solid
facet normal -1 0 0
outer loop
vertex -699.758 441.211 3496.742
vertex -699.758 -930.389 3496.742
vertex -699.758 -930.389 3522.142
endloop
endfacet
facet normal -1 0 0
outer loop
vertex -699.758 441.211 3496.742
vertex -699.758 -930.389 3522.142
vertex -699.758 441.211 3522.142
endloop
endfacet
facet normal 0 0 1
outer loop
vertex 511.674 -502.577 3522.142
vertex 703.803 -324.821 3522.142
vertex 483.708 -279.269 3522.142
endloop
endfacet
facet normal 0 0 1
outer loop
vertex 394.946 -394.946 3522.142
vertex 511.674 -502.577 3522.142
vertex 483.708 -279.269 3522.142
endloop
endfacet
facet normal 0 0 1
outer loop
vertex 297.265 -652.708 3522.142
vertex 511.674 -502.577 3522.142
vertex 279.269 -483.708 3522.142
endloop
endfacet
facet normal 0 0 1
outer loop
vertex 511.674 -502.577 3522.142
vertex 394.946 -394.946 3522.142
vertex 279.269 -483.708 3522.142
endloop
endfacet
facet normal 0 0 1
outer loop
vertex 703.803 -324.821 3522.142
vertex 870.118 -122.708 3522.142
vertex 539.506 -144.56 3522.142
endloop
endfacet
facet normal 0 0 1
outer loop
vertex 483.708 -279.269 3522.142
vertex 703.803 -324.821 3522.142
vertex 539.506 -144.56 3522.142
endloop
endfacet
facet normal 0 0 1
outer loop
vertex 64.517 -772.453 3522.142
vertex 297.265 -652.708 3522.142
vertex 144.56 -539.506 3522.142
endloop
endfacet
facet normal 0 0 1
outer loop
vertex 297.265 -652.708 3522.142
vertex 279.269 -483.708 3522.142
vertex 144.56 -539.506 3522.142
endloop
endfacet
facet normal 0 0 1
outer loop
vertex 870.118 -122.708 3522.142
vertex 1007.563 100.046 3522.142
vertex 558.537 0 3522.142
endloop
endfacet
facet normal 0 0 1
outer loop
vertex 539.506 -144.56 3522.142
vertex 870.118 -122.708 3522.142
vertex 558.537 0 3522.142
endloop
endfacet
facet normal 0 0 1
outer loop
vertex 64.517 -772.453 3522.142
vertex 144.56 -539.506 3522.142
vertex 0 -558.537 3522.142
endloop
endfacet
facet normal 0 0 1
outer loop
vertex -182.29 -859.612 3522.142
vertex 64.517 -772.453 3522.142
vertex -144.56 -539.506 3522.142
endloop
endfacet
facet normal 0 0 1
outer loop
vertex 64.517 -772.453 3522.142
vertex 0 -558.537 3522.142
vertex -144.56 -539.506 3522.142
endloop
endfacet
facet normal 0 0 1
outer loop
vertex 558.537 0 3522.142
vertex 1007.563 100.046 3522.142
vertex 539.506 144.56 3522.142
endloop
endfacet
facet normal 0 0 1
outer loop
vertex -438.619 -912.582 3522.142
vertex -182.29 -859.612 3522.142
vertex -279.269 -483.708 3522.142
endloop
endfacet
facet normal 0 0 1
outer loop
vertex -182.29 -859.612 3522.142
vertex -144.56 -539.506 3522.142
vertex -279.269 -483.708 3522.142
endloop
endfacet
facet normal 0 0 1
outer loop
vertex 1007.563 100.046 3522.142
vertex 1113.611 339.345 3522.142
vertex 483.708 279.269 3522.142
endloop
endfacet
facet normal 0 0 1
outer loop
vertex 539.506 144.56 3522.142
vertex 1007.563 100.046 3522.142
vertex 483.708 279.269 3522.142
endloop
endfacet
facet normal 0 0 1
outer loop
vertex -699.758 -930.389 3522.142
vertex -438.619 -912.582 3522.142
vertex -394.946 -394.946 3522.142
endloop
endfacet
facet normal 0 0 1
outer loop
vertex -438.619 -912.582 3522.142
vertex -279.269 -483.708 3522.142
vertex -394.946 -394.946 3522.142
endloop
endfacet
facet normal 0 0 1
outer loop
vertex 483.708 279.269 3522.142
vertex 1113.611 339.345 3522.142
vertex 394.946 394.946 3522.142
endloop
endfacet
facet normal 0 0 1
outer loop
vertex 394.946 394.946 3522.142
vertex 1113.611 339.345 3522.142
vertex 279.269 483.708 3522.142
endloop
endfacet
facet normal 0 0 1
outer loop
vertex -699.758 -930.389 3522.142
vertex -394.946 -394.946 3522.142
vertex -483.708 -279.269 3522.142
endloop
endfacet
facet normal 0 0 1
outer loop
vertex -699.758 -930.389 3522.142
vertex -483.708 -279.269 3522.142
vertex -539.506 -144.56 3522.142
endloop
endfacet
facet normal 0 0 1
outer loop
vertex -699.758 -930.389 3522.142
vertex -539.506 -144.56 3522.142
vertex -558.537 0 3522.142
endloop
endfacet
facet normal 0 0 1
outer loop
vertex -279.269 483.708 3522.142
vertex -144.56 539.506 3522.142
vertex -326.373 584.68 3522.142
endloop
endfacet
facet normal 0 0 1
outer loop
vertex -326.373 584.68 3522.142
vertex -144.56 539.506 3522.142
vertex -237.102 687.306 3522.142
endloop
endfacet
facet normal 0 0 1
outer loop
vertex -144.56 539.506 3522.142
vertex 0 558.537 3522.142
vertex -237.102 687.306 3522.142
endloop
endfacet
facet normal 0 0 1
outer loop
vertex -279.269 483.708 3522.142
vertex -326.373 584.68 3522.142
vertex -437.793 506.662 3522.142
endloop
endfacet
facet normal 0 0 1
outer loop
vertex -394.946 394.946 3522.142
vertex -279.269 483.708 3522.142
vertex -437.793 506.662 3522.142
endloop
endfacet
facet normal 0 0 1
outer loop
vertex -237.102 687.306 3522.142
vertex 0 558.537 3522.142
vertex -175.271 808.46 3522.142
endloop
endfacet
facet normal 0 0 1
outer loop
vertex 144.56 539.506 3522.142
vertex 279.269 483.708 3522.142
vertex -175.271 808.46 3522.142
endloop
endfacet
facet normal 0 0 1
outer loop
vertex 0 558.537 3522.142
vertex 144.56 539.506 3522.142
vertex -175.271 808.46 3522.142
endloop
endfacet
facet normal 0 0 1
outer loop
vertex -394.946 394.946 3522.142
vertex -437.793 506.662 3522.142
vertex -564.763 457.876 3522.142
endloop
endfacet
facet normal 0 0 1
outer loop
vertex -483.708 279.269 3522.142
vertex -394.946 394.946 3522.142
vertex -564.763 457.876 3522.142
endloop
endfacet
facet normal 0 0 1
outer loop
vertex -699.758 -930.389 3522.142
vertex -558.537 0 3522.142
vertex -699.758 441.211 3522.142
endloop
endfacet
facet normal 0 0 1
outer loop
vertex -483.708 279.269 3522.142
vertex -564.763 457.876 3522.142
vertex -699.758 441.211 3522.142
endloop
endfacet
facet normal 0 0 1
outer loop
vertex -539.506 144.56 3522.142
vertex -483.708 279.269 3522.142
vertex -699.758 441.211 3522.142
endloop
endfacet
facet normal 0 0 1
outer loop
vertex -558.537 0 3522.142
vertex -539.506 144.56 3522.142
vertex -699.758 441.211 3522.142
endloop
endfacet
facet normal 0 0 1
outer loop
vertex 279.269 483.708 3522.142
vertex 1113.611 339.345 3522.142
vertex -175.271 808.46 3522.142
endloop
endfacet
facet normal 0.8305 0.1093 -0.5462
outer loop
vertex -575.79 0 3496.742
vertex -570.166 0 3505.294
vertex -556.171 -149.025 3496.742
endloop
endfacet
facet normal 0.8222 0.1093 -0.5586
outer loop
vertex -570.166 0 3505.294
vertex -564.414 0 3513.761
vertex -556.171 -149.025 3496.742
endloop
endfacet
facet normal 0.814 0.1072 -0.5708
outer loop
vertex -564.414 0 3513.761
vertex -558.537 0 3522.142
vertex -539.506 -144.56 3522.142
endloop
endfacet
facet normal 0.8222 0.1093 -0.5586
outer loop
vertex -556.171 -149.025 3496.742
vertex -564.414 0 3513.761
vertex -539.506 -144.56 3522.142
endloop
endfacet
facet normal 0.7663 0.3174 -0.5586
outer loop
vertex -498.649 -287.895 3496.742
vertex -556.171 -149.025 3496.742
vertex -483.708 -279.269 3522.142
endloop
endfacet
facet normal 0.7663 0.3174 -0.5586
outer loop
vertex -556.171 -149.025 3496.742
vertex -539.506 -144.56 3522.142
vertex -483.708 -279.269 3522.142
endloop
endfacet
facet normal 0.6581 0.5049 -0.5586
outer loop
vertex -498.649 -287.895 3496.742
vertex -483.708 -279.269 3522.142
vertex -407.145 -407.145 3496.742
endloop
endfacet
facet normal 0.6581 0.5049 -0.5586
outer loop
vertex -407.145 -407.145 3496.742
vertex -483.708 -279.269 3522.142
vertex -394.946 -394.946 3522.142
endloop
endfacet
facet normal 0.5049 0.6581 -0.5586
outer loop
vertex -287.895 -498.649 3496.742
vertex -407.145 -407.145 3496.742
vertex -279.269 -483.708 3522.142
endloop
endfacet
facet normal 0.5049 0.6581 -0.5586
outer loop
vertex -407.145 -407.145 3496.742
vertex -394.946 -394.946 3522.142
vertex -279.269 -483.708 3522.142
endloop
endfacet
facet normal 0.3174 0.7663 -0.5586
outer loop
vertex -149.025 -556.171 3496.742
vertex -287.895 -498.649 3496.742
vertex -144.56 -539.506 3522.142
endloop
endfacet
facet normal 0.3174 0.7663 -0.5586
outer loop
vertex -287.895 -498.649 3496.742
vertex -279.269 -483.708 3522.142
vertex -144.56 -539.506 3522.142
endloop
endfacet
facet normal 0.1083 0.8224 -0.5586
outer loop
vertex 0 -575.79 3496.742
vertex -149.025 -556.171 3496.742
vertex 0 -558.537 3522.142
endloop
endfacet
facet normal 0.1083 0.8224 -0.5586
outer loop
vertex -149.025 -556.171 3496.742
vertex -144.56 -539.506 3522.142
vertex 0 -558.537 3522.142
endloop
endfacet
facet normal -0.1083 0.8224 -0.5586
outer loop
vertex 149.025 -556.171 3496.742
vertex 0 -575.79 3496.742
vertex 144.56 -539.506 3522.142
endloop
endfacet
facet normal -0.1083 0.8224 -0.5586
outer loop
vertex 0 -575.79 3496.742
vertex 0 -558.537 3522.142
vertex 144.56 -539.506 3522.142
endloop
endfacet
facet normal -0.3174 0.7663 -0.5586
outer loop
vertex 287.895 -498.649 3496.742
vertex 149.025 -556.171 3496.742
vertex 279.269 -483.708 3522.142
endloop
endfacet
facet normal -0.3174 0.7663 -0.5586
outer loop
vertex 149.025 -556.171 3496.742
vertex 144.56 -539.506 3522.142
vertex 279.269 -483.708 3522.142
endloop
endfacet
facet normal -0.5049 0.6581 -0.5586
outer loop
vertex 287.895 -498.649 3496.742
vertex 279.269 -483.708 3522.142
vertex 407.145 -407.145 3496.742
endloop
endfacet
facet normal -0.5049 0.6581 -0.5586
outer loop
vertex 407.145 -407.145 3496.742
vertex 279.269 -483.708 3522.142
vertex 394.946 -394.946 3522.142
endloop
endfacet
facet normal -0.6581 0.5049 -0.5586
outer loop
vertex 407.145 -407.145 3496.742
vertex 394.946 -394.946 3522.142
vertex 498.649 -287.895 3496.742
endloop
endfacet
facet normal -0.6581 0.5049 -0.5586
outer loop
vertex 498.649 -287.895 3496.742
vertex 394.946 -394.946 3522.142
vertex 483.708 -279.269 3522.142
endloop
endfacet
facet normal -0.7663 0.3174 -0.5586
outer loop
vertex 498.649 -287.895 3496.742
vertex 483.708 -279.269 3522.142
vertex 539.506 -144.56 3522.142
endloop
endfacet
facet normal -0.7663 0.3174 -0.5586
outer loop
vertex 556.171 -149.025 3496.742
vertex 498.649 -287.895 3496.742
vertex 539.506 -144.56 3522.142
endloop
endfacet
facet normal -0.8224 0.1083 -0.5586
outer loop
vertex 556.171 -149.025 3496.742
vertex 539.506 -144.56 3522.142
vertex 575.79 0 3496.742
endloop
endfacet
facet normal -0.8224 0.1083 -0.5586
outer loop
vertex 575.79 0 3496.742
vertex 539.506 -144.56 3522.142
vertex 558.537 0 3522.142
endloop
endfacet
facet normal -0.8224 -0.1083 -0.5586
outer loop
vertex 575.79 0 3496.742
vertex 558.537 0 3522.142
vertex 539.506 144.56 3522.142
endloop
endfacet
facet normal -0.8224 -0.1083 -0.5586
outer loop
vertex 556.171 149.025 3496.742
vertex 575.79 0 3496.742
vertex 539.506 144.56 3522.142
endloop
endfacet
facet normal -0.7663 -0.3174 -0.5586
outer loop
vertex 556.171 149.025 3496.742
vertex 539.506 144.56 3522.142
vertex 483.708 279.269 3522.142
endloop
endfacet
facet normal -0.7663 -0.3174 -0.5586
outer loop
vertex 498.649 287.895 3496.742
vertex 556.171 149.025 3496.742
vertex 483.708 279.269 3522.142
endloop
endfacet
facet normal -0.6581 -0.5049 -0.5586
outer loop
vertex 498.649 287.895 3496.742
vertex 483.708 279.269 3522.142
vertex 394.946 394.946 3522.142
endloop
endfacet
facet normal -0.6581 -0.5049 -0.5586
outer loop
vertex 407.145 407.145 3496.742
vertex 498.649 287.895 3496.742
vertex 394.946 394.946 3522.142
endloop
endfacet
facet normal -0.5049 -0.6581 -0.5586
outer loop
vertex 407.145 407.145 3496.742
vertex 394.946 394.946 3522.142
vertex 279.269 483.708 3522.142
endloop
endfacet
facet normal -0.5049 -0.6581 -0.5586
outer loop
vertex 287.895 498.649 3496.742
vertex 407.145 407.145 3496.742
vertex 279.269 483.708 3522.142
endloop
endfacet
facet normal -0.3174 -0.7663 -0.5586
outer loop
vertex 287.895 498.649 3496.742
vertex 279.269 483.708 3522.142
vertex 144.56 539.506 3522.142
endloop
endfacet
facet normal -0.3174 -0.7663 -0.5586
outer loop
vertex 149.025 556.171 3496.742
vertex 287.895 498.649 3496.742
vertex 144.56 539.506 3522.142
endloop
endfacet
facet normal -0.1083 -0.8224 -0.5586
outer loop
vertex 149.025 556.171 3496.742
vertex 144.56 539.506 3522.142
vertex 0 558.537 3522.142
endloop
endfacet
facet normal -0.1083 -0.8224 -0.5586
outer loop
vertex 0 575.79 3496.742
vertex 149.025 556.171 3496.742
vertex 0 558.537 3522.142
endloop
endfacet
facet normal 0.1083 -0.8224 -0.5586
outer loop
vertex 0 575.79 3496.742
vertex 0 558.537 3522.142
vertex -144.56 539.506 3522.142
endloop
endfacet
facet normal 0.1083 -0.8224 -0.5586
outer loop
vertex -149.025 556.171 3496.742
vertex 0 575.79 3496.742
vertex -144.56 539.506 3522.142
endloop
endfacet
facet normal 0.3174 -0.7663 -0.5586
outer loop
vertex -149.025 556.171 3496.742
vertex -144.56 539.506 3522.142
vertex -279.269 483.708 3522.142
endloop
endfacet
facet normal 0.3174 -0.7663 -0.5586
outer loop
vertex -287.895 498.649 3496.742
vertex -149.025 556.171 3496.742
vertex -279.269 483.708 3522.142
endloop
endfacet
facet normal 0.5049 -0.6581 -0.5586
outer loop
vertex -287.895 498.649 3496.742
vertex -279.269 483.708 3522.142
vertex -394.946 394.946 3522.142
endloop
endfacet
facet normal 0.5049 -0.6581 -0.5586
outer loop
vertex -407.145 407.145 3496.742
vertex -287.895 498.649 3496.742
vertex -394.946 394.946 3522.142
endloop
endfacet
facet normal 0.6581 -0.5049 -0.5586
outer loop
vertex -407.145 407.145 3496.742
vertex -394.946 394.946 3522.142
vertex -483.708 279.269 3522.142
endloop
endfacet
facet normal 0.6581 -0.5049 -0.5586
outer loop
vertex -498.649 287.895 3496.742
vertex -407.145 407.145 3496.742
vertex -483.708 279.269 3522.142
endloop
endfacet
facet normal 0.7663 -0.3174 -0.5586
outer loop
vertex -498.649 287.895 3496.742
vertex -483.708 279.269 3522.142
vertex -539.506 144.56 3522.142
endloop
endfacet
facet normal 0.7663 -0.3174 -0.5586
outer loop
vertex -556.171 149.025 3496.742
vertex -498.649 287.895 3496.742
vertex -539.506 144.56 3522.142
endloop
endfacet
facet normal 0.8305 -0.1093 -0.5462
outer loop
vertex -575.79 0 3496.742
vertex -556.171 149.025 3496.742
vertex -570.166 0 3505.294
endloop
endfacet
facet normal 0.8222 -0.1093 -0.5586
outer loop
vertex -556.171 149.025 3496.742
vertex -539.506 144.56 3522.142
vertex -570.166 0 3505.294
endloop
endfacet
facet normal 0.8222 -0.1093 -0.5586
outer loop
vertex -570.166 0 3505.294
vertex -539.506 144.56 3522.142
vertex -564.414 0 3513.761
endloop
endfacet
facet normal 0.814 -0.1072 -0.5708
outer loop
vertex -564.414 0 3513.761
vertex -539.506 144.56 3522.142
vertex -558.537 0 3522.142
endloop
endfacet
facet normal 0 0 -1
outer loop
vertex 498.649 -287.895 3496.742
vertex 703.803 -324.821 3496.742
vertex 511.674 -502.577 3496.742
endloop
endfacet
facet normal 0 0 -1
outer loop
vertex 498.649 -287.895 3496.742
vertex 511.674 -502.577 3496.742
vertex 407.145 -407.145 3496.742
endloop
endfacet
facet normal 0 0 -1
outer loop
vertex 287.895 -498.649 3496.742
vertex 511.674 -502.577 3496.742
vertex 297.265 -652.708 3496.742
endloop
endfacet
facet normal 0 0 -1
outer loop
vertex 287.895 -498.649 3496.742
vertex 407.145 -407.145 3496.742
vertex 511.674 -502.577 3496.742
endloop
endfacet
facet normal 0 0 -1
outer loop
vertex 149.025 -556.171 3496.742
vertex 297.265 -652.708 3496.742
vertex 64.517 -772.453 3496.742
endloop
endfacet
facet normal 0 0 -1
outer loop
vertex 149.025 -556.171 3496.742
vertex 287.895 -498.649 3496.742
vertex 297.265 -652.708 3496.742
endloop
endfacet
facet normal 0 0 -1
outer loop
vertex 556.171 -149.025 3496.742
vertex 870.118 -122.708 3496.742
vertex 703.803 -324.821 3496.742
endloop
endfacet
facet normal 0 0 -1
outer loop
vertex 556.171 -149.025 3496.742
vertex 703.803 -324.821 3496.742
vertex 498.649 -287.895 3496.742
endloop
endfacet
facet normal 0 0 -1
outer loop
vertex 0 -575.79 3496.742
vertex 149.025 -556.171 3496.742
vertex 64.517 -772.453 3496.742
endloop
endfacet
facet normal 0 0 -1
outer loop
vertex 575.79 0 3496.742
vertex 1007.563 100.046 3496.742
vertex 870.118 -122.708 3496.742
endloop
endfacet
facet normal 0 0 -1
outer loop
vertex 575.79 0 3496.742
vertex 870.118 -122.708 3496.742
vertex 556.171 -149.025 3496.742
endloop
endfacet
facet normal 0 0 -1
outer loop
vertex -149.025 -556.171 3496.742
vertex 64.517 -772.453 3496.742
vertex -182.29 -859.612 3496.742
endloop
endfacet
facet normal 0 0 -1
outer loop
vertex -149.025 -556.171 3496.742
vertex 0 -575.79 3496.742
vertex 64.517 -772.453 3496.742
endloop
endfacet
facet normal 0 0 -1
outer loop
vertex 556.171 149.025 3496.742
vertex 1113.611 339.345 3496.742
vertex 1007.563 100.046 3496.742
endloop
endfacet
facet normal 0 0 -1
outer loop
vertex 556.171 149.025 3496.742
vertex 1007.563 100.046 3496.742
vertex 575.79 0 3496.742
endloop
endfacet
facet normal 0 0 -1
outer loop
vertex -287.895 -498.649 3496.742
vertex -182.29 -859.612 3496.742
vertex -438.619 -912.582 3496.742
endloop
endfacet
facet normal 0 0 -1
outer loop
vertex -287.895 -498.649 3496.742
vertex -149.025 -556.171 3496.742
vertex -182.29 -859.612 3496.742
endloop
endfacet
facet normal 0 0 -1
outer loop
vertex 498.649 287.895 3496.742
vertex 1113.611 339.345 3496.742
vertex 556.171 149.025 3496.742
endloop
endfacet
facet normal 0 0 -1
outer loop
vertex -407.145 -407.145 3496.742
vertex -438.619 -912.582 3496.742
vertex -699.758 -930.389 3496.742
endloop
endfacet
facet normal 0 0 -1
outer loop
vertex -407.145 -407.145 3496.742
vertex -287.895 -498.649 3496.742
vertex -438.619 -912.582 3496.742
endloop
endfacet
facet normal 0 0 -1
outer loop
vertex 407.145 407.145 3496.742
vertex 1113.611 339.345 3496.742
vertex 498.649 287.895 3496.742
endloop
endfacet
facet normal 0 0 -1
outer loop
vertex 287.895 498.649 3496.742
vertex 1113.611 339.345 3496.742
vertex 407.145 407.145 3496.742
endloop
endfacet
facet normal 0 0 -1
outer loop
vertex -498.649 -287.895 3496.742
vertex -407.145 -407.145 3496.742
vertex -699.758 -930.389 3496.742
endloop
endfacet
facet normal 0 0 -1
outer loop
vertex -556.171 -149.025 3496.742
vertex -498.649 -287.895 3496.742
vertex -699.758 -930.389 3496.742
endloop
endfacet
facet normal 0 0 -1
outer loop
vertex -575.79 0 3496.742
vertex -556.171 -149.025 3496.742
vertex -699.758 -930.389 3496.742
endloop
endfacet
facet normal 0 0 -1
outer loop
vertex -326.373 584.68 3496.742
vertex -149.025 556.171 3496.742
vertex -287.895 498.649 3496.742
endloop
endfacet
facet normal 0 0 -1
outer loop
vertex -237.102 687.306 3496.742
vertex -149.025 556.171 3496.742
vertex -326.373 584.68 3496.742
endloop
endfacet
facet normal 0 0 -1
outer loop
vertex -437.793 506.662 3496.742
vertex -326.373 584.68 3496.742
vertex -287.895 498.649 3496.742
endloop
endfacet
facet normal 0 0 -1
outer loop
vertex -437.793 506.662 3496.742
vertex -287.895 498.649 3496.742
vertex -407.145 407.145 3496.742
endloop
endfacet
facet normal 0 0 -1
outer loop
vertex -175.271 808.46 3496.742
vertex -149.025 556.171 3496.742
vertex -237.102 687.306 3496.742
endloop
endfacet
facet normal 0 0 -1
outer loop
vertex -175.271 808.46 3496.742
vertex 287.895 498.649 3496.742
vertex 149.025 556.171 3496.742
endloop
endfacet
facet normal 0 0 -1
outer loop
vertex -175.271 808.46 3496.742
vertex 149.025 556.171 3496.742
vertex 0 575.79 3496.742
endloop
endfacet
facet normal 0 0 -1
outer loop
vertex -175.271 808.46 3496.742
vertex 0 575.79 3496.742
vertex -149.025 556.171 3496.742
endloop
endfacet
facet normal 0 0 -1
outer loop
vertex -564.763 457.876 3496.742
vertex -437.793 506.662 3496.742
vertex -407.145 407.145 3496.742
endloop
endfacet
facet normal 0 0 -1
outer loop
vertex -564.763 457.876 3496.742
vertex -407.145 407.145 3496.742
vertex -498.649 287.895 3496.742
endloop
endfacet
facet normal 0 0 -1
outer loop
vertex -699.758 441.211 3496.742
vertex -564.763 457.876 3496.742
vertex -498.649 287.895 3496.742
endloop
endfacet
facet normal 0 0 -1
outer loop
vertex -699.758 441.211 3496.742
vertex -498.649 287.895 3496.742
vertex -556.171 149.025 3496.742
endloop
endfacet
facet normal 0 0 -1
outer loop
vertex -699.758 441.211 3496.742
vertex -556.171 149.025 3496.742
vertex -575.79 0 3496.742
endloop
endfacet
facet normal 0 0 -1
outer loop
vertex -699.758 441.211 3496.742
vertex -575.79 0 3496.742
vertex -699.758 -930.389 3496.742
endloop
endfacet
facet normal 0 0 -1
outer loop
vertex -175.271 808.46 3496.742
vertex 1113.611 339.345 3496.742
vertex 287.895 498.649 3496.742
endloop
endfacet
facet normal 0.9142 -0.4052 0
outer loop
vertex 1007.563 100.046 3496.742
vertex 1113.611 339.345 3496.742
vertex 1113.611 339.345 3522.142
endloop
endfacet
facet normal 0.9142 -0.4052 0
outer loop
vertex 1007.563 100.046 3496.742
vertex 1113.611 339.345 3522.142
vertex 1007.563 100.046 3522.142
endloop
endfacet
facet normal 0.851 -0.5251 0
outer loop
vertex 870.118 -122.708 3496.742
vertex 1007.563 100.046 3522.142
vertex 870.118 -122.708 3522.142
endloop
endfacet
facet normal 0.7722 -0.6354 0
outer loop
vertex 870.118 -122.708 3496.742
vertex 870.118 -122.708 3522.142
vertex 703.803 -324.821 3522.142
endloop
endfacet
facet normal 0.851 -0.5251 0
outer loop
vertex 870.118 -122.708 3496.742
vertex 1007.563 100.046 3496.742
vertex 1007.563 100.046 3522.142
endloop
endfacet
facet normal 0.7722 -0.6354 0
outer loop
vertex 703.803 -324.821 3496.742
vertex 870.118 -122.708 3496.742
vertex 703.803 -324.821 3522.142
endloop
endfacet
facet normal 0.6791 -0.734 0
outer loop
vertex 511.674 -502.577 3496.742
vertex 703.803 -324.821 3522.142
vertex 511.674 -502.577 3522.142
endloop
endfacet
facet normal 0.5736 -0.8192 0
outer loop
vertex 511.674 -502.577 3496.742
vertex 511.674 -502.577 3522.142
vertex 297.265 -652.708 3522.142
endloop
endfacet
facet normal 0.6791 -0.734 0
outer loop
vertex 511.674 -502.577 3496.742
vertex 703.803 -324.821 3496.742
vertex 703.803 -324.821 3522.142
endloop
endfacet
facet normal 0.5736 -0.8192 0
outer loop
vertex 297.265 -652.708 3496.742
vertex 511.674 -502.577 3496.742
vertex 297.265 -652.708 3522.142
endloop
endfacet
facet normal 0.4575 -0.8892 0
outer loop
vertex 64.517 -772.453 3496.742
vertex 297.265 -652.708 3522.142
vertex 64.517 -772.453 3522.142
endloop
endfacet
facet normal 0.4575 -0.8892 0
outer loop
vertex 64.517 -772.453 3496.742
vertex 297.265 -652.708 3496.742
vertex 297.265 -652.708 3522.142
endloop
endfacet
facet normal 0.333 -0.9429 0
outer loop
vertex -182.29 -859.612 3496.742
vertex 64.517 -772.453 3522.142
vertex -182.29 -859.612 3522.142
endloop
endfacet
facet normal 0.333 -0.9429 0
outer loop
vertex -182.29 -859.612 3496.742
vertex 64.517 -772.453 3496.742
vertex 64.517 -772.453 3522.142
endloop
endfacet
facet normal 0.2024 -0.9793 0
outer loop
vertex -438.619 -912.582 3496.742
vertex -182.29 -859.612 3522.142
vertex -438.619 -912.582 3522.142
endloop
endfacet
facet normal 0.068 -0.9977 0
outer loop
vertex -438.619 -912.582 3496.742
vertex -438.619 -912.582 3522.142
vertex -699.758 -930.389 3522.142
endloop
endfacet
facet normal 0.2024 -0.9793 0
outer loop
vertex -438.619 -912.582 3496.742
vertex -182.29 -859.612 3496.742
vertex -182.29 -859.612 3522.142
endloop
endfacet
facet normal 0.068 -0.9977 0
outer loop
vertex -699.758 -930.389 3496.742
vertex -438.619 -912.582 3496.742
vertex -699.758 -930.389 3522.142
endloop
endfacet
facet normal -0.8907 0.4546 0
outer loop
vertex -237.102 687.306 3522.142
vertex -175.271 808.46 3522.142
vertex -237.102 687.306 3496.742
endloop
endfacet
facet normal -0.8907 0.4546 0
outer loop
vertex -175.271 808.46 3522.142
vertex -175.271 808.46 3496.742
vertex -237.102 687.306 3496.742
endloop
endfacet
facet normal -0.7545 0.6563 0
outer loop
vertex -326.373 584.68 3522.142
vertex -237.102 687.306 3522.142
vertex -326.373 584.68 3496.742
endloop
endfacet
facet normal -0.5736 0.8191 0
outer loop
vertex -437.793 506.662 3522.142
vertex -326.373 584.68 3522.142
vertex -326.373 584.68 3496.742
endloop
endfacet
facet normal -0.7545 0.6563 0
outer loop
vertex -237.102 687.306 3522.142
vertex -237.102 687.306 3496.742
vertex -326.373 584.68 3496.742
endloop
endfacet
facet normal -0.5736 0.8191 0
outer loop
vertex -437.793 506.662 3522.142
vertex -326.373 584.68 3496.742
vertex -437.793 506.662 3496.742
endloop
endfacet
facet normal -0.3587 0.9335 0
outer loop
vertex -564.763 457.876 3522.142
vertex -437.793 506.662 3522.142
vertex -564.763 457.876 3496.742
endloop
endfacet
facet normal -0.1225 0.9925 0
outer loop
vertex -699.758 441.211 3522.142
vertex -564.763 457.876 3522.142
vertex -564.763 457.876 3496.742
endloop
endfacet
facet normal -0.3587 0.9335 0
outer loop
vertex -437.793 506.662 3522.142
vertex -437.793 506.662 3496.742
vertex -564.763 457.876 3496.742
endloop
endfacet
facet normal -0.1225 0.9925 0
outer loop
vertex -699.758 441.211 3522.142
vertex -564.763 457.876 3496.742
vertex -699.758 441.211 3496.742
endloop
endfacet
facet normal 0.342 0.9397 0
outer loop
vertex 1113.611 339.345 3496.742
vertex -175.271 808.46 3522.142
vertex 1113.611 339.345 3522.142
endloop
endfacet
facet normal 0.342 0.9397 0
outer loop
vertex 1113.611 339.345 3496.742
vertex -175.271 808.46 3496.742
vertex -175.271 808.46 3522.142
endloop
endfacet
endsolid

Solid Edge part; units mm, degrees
sketch "Sketch1" plane through (0, 0, 0) normal (0, -1, 0) x (1, 0, 0)
  line L0 (-647.7, 0) -> (-647.7, 3349.6026)
  line L1 (0, 0) -> (0, 3810)
  line L2 (0, 0) -> (-647.7, 0)
  arc A0 (-647.7, 3349.6026) -> (0, 3810) centre (0, 3124.2) cw
revolve "RevolvedProtrusion1" add sketch "Sketch1" angle 360 about axis through (0, 0, 0) along (0, 0, 1)
sketch "Sketch2" plane through (0, 0, 3496.7418) normal (0, 0, 1) x (1, 0, 0)
  arc A0 (1113.6113, 339.3453) -> (-699.7577, -930.3894) centre (-700.215, 1000.0106) cw
  line L0 (-699.7577, -930.3894) -> (-699.7577, 441.2108)
  arc A1 (-175.2713, 808.4602) -> (-699.7577, 441.2108) centre (-700.2149, 1000.0106) cw
  line L1 (-175.2713, 808.4602) -> (1113.6113, 339.3453)
extrude "ExtrudedProtrusion_2" add sketch "Sketch2" along normal blind 25.4
sketch "Sketch3" plane through (0, 0, 0) normal (0, -1, 0) x (1, 0, 0)
  line L0 (-647.7, 0) -> (-647.7, 3349.6026)
  line L1 (0, 0) -> (0, 3810)
  line L2 (0, 0) -> (-647.7, 0)
  arc A0 (-647.7, 3349.6026) -> (0, 3810) centre (0, 3124.2) cw
revolve "RevolvedCutout1" cut sketch "Sketch3" angle 360 about axis through (0, 0, 0) along (0, 0, 1)
